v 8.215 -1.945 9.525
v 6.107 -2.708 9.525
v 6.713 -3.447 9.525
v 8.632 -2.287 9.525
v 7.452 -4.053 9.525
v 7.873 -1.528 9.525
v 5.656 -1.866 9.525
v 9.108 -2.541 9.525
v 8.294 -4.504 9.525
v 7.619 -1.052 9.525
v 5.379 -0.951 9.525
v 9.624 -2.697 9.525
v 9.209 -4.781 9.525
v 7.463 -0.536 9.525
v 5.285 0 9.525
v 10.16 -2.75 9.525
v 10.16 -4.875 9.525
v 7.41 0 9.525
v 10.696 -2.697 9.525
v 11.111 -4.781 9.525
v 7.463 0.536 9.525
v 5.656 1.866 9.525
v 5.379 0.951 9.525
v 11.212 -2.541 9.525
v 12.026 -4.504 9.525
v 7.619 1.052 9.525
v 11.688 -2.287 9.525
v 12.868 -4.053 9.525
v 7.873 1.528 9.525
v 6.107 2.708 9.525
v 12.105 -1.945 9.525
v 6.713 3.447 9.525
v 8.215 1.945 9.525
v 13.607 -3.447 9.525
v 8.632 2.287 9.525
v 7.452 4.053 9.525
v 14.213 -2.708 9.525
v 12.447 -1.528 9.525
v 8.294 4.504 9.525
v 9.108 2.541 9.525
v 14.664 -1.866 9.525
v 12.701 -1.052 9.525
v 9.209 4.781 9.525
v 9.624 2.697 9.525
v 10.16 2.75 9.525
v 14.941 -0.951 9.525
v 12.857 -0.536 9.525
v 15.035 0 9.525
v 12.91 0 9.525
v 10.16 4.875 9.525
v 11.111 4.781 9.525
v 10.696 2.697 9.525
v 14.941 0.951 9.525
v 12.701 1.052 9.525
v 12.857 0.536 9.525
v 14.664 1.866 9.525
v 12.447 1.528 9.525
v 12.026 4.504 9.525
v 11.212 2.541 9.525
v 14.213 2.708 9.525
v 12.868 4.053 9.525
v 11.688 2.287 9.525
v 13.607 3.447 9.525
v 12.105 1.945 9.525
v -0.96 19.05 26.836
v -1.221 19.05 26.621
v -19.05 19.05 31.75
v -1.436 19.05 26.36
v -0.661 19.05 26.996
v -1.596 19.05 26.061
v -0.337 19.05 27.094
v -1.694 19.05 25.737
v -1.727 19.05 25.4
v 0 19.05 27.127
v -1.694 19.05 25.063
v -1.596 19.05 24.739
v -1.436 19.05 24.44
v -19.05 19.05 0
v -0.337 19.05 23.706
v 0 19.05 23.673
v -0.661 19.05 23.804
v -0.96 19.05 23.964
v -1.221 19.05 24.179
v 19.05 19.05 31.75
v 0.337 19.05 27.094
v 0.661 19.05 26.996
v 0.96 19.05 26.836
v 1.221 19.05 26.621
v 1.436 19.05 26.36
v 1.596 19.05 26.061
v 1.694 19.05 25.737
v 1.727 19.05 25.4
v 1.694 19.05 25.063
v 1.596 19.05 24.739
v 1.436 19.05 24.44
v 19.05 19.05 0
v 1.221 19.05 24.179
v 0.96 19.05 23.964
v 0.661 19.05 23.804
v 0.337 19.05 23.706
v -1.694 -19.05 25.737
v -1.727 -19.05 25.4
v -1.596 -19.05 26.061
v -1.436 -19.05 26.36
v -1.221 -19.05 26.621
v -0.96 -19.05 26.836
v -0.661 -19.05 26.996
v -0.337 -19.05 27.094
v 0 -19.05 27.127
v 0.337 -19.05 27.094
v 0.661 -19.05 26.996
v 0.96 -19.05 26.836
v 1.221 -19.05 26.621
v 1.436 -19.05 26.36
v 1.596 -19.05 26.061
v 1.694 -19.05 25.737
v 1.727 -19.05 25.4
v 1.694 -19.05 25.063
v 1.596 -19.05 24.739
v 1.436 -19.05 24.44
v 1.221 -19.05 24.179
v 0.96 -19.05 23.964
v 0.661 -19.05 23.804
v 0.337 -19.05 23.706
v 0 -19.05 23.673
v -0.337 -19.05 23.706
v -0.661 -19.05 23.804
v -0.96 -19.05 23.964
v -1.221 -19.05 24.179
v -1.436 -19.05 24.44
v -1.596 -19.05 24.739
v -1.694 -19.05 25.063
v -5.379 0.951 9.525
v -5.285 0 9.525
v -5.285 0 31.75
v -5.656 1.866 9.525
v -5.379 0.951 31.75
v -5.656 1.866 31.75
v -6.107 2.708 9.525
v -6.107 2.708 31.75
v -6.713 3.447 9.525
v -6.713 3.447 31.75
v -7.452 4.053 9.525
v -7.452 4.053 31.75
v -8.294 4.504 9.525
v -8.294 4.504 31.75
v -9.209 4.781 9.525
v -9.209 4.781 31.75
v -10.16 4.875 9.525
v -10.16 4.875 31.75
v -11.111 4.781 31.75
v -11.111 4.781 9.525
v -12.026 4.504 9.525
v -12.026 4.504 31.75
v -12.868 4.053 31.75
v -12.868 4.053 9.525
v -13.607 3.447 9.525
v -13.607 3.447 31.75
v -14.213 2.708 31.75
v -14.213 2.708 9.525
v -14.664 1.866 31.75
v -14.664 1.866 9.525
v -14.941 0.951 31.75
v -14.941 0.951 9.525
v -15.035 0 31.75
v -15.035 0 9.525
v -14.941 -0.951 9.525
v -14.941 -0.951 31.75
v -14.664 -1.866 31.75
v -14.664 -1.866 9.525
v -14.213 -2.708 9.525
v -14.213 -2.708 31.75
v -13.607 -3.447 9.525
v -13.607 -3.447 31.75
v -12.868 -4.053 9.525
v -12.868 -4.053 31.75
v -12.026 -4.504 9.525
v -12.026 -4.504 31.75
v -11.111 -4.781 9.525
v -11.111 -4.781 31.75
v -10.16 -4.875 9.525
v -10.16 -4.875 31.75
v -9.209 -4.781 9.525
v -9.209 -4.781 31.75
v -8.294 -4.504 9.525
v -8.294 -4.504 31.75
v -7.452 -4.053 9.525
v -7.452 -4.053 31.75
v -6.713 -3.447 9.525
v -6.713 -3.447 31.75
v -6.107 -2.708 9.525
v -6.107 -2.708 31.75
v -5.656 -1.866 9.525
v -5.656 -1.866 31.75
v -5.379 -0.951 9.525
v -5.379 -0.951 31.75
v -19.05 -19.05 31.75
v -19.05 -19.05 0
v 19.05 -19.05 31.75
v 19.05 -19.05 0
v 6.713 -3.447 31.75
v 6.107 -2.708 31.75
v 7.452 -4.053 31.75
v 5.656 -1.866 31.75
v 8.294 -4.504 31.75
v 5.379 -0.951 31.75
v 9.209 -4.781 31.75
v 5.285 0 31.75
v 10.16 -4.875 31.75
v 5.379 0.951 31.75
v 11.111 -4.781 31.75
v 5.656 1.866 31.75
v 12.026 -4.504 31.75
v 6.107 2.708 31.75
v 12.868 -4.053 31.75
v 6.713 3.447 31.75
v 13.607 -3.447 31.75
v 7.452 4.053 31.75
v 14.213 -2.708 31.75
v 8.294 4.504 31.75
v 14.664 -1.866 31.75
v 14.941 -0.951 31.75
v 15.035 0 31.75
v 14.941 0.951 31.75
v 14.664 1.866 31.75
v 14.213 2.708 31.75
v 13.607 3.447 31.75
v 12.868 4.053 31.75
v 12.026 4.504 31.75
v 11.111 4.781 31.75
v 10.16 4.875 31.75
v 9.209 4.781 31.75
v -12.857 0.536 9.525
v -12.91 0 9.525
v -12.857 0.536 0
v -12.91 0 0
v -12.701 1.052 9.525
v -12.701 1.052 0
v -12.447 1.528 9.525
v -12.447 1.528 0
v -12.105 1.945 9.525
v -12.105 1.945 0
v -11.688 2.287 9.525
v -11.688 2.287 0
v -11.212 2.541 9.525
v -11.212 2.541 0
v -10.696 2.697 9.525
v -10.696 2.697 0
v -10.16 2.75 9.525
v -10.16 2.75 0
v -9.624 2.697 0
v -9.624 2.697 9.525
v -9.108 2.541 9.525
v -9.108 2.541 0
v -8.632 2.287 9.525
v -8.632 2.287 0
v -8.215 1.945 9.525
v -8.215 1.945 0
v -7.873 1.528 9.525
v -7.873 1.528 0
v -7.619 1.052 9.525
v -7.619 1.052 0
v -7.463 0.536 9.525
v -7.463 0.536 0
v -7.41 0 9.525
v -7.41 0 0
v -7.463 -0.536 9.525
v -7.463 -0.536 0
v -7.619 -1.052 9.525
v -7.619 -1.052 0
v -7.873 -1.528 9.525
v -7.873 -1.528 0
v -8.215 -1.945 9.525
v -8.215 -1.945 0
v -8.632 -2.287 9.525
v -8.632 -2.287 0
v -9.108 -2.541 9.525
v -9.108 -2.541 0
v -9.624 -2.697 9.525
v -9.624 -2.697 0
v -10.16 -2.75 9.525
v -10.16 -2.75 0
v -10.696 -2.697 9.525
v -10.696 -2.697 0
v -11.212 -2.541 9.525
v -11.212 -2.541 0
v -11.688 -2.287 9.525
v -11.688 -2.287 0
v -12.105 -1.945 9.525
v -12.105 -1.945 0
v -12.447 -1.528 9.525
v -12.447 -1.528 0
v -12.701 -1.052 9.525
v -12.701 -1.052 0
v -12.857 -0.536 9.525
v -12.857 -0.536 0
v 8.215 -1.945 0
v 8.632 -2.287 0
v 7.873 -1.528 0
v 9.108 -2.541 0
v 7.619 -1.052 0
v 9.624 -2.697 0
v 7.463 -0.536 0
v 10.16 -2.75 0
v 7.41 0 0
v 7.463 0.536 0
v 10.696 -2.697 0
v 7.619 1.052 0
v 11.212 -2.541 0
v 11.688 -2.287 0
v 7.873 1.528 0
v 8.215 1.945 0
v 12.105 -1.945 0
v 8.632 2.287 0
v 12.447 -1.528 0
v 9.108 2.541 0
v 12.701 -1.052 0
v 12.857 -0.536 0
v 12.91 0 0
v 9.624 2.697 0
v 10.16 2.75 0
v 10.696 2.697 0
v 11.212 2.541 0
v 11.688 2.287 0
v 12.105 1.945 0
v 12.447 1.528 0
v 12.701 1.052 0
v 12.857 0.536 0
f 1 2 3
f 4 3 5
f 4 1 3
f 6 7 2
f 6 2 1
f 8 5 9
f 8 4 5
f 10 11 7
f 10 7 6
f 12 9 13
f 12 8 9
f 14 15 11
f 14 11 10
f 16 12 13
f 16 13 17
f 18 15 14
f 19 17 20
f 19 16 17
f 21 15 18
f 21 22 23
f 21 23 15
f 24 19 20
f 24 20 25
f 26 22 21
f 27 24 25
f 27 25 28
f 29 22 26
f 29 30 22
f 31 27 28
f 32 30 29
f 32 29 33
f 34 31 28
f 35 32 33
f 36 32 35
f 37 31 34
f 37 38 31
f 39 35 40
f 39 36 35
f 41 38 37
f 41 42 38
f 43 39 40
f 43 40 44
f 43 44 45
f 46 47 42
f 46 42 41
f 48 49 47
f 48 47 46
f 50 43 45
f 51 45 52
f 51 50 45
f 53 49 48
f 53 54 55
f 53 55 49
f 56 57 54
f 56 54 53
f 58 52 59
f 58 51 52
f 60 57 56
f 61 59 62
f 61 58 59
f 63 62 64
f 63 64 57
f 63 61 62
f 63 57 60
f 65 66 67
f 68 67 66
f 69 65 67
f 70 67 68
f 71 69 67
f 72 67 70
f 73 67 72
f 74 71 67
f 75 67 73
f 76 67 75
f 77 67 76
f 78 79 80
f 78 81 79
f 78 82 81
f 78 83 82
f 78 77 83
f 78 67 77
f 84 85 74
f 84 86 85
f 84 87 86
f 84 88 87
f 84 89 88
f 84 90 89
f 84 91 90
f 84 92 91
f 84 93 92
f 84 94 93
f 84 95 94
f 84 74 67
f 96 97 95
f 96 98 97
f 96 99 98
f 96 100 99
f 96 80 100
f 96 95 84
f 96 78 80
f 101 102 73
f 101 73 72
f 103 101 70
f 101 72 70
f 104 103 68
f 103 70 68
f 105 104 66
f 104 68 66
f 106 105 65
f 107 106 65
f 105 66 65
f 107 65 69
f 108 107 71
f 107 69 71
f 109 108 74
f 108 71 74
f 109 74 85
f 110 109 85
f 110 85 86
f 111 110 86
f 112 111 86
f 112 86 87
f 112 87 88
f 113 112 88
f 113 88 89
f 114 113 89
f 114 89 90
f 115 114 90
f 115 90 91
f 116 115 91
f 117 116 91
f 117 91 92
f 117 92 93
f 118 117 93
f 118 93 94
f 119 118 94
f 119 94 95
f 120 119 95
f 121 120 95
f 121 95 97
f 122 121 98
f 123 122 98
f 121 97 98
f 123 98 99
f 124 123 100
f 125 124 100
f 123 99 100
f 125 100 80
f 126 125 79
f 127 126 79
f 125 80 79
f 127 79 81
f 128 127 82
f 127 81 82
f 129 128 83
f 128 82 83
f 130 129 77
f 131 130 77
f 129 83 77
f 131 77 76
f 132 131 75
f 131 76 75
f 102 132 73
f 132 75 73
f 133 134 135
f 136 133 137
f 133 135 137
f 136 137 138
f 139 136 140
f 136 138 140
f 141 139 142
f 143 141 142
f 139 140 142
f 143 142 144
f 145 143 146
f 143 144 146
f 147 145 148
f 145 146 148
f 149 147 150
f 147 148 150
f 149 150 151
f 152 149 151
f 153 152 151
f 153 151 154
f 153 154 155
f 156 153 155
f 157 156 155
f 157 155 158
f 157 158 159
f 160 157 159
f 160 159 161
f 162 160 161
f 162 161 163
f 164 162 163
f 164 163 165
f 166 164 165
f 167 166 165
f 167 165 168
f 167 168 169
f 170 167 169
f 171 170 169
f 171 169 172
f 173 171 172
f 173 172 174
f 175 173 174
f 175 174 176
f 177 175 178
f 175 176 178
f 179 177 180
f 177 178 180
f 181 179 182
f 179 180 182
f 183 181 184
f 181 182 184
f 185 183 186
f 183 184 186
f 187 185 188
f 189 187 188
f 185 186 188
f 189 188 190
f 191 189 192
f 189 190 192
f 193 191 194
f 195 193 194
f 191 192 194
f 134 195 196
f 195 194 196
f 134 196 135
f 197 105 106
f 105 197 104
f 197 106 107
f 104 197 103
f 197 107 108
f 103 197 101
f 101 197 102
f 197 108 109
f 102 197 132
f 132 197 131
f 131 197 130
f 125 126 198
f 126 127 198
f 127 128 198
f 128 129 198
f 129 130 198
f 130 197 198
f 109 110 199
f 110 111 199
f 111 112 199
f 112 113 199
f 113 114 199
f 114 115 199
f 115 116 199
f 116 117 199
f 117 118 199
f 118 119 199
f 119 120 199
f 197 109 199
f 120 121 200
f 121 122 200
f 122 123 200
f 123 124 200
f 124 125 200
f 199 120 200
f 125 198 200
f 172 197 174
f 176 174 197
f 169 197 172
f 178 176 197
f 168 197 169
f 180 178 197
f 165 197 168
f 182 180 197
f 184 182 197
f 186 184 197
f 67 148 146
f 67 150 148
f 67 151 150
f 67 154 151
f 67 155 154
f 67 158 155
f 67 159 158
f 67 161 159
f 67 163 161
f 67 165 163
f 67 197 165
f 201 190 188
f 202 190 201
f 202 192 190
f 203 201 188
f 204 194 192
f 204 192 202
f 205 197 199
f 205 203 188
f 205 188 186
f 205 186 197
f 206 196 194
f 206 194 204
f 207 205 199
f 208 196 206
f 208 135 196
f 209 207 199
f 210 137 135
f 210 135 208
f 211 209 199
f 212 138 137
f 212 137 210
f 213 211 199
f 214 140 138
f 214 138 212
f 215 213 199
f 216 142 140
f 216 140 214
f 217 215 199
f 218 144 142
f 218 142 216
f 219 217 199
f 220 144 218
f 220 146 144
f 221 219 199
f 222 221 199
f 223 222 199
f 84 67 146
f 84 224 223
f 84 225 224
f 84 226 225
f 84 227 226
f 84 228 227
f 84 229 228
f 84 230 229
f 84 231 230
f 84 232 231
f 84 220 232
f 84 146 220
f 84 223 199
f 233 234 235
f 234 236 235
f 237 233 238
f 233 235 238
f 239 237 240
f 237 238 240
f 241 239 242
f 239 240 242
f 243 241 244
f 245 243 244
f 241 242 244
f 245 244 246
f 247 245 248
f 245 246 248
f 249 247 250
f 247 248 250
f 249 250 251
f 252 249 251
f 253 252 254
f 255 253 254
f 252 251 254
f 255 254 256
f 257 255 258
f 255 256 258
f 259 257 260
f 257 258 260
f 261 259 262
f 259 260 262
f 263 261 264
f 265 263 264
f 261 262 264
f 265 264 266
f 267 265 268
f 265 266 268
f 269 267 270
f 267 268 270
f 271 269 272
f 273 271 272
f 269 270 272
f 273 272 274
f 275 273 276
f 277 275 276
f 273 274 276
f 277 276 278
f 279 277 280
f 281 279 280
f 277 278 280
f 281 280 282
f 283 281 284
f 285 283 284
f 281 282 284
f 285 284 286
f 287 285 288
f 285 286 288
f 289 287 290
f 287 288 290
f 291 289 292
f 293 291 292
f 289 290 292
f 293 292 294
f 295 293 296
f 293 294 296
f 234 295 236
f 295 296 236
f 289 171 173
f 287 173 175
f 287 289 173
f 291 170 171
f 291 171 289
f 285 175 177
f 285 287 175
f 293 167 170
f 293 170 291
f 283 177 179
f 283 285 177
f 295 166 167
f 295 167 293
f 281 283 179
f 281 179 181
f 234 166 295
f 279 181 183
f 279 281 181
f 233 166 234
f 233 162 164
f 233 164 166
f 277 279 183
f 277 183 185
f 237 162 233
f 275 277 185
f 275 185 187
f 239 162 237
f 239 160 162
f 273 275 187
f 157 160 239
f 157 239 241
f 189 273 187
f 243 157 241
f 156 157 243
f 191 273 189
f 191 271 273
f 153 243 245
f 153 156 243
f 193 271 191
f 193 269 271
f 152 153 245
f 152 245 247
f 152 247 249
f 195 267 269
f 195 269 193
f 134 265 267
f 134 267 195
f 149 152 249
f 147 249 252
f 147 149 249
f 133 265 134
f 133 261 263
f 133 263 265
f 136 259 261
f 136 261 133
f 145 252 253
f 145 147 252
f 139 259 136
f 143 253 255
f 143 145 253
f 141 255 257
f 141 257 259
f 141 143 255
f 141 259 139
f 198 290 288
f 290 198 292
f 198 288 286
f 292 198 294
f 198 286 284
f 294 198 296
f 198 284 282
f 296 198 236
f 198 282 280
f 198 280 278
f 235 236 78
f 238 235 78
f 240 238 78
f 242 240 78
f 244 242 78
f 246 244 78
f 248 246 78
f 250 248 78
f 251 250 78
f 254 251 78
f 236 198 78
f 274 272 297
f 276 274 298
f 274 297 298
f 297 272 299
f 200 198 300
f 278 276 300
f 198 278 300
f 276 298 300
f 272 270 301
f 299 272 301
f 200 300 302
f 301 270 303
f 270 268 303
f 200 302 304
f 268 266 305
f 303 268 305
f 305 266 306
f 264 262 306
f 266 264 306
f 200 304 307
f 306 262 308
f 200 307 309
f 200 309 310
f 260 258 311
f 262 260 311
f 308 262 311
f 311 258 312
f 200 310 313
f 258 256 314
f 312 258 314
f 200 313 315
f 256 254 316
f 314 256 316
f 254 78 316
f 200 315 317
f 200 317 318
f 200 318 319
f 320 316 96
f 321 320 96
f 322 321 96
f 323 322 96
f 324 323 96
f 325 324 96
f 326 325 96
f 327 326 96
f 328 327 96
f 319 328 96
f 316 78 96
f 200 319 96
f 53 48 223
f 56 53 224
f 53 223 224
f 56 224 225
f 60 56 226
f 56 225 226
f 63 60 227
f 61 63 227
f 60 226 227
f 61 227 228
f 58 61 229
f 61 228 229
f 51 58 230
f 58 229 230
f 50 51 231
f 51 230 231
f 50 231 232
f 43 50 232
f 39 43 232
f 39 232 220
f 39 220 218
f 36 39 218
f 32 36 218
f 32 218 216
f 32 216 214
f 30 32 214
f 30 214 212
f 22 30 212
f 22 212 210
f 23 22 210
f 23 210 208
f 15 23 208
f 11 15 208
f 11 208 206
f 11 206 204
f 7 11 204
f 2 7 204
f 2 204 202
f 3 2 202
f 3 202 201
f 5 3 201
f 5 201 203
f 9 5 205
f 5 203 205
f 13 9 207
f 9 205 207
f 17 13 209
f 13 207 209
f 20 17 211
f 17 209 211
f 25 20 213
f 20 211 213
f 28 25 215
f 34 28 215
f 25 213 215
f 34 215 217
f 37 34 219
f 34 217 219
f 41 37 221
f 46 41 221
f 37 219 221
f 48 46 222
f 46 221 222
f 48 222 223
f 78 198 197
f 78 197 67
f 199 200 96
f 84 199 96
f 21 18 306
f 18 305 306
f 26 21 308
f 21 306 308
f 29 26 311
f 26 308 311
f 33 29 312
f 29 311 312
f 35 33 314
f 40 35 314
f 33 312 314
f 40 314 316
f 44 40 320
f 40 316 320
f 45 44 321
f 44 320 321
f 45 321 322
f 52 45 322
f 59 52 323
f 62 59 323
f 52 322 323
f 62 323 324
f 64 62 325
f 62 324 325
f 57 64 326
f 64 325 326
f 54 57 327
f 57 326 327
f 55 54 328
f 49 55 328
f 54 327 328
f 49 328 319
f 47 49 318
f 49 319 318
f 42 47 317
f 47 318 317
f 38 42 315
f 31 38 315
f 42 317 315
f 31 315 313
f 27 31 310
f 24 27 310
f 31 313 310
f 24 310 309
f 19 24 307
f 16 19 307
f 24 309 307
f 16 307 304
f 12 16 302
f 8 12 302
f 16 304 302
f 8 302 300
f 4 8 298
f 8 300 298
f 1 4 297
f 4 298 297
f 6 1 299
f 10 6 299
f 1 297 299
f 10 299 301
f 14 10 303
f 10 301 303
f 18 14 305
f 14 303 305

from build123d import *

# Parameters (mm, degrees)
F0_W           = 38.1
F0_H           = 38.1
F1_DEPTH       = 31.75
F3_D           = 3.4544
F5_D           = 5.5
F5_CBORE_D     = 9.75
F5_CBORE_DEPTH = 22.225


with BuildPart() as f1:
    # F0 (on Top) → F1 (new body)
    with BuildSketch(Plane.XY):
        Rectangle(F0_W, F0_H)
    extrude(amount=F1_DEPTH)

    # F3 (through all)
    with Locations(Plane.XZ.offset(19.05)):
        with Locations((0, 25.4)):
            Hole(F3_D / 2)

    # F5 (through all)
    with Locations(Plane.XY.offset(31.75)):
        with Locations((10.16, 0), (-10.16, 0)):
            CounterBoreHole(F5_D / 2, F5_CBORE_D / 2, F5_CBORE_DEPTH)


solid = f1.part
